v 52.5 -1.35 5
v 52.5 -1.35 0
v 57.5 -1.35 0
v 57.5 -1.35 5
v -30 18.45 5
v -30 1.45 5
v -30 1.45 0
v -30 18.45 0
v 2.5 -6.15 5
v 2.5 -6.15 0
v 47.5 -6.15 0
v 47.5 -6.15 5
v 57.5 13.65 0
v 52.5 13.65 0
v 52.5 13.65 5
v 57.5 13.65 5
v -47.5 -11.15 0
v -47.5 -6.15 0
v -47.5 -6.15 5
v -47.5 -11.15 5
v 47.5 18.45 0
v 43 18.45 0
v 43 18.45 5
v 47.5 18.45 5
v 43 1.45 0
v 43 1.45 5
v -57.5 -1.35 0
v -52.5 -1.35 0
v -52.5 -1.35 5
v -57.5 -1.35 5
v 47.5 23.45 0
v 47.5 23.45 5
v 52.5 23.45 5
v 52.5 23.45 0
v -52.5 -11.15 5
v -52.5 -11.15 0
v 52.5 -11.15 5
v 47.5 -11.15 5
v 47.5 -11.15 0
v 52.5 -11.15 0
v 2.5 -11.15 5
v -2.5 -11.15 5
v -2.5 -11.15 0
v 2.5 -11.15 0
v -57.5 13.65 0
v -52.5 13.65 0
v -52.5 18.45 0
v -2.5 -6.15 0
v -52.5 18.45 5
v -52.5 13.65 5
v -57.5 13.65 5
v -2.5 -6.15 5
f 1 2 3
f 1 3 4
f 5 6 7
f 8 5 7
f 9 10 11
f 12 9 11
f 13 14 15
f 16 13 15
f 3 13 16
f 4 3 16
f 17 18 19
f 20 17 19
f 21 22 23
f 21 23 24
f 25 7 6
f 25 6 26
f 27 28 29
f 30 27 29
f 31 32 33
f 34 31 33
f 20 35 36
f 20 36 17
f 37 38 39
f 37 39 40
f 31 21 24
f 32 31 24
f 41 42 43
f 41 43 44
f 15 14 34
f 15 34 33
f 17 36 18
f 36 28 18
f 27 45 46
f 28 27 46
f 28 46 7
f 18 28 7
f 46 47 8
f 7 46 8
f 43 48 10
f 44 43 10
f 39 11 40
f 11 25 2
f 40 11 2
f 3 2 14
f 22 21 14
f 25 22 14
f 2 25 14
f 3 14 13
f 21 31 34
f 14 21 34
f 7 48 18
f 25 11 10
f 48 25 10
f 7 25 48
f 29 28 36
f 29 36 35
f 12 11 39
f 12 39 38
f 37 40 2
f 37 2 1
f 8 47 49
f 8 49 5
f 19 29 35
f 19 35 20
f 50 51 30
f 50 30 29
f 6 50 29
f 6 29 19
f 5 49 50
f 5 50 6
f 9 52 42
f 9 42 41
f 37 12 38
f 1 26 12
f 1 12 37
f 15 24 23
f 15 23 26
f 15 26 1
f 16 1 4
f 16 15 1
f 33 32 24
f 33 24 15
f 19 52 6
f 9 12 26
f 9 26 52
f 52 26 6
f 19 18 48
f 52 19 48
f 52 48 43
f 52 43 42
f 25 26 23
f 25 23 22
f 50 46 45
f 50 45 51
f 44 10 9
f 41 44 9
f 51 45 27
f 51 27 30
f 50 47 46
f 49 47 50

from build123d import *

# Parameters (mm, degrees)
SKETCH1_W           = 105
SKETCH1_H           = 12.3
BOSS_EXTRUDE1_DEPTH = 5
SKETCH2_W           = 5
SKETCH2_H           = 5
BOSS_EXTRUDE2_DEPTH = 5
SKETCH3_W           = 73
SKETCH3_H           = 5
CUT_EXTRUDE1_DEPTH  = 17
SKETCH4_W           = 5
SKETCH4_H           = 5
BOSS_EXTRUDE3_DEPTH = 5
SKETCH5_W           = 5
SKETCH5_H           = 15
BOSS_EXTRUDE4_DEPTH = 5


with BuildPart() as part:
    # Sketch1 → Boss-Extrude1 (new body)
    with BuildSketch(Plane.XY):
        Rectangle(SKETCH1_W, SKETCH1_H)
    extrude(amount=BOSS_EXTRUDE1_DEPTH)

    # Sketch2 → Boss-Extrude2 (add)
    with BuildSketch(Plane.XZ.offset(6.15)):
        with Locations((50, 2.5)):
            Rectangle(SKETCH2_W, SKETCH2_H)
    extrude(amount=BOSS_EXTRUDE2_DEPTH)

    # Mirror1: part across plane


with BuildPart() as part_1:
    add(part.part)
    add(part.part.mirror(Plane(origin=(-52.5, 6.15, 5), x_dir=(0, 0, 1), z_dir=(0, -1, 0))))

    # Sketch3 → Cut-Extrude1 (cut)
    with BuildSketch(Plane(origin=(0, 18.45, 0), x_dir=(1, 0, 0), z_dir=(0, 1, 0))):
        with Locations((6.5, -2.5)):
            Rectangle(SKETCH3_W, SKETCH3_H)
    extrude(amount=-CUT_EXTRUDE1_DEPTH, mode=Mode.SUBTRACT)

    # Sketch4 → Boss-Extrude3 (add)
    with BuildSketch(Plane.XZ.offset(6.15)):
        with Locations((0, 2.5)):
            Rectangle(SKETCH4_W, SKETCH4_H)
        with Locations((-50, 2.5)):
            Rectangle(SKETCH4_W, SKETCH4_H)
    extrude(amount=BOSS_EXTRUDE3_DEPTH)

    # Sketch5 → Boss-Extrude4 (add)
    with BuildSketch(Plane.ZY.offset(52.5)):
        with Locations((2.5, 6.15)):
            Rectangle(SKETCH5_W, SKETCH5_H)
    boss_extrude4 = extrude(amount=BOSS_EXTRUDE4_DEPTH)

    # Mirror2: Boss-Extrude4 across plane
    add(boss_extrude4.mirror(Plane(origin=(0, 0, 0), x_dir=(0, 0, 1), z_dir=(1, 0, 0))))


solid = part_1.part
